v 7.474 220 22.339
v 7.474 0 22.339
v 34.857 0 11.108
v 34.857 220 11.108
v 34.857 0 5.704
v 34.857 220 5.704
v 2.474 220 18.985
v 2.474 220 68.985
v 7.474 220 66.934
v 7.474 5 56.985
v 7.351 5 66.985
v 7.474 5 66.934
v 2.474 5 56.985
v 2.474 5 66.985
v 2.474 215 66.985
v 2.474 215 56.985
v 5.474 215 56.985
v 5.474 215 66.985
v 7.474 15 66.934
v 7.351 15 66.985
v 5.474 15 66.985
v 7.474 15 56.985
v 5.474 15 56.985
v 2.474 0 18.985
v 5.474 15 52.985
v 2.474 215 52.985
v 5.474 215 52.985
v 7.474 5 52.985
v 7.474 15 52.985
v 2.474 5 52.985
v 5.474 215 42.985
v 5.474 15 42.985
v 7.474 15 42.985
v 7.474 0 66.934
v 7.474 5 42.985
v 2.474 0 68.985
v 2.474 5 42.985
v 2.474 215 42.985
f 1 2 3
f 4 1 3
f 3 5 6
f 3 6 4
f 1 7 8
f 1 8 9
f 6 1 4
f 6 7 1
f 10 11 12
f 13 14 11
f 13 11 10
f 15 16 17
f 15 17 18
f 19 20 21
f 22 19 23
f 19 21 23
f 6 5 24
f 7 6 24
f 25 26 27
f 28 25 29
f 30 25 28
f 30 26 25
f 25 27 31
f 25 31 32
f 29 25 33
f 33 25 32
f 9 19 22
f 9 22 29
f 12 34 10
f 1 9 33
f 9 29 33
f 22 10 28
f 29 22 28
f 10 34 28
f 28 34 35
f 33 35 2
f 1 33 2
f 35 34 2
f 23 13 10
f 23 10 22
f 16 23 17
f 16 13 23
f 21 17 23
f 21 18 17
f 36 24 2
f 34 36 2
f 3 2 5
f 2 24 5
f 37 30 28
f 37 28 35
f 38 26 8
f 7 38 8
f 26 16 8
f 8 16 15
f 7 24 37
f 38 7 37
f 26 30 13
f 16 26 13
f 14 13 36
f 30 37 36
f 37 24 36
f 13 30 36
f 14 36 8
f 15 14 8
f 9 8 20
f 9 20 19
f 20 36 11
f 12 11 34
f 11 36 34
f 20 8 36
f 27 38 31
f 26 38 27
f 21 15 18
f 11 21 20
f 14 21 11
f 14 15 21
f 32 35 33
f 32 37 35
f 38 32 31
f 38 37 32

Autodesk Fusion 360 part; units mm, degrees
sketch "Sketch1" plane through (0, 0, 0) normal (0, 1, 0) x (1, 0, 0)
  line L0 (2.4744, -68.9852) -> (7.4744, -68.9852)
  line L1 (7.4744, -68.9852) -> (7.4744, -22.3387)
  line L2 (7.4744, -22.3387) -> (36.754, -10.3303)
  line L3 (36.754, -10.3303) -> (34.8567, -5.7042)
  line L4 (34.8567, -5.7042) -> (2.4744, -18.9852)
  line L5 (2.4744, -18.9852) -> (2.4744, -68.9852)
  line L6 (2.4744, -68.9852) -> (7.4744, -66.9345)
  line L7 (34.8567, -5.7042) -> (34.8567, -11.1084)
  dimension "d1" = 5
  dimension "d2" = 5
  dimension "d3" = 112.3
  dimension "d16" = 50
  dimension "d18" = 22.3
  dimension "d20" = 35
extrude "Extrude1" add sketch "Sketch1" along normal blind 220 contours L1 L2 L4 L5 L6 L7
sketch "Sketch2" plane through (2.4744, 0, 0) normal (-1, 0, 0) x (0, -1, 0)
  line L0 (0, 18.9852) -> (0, 68.9852)
  line L1 (-220, 68.9852) -> (-220, 18.9852)
  line L2 (-220, 18.9852) -> (0, 18.9852)
  line L3 (-215, 66.9852) -> (-5, 66.9852)
  line L4 (-5, 66.9852) -> (-5, 56.9852)
  line L5 (-5, 56.9852) -> (-215, 56.9852)
  line L6 (-215, 56.9852) -> (-215, 66.9852)
  line L7 (-215, 52.9852) -> (-5, 52.9852)
  line L8 (-5, 52.9852) -> (-5, 42.9852)
  line L9 (-5, 42.9852) -> (-215, 42.9852)
  line L10 (-215, 42.9852) -> (-215, 52.9852)
  line L11 (-5, 66.9852) -> (-15, 66.9852)
  line L12 (-15, 56.9852) -> (-5, 56.9852)
  line L13 (-5, 56.9852) -> (-5, 66.9852)
  line L14 (-5, 52.9852) -> (-15, 52.9852)
  line L15 (-15, 42.9852) -> (-5, 42.9852)
  line L16 (-5, 42.9852) -> (-5, 52.9852)
  line L17 (0, 68.9852) -> (-220, 68.9852)
  dimension "d6" = 210
  dimension "d7" = 210
  dimension "d8" = 5
  dimension "d9" = 5
  dimension "d12" = 10
  dimension "d13" = 10
  dimension "d22" = 4
  dimension "d30" = 2
extrude "Extrude2" cut sketch "Sketch2" against normal blind 3 contours L3 L4 L5 L6 L11 L12 L13 | L7 L8 L9 L10 L14 L15 L16
sketch "Sketch3" plane through (5.4744, 0, 0) normal (-1, 0, 0) x (0, -1, 0)
  line L0 (-215, 56.9852) -> (-5, 56.9852)
  line L1 (-5, 56.9852) -> (-5, 66.9852)
  line L2 (-5, 66.9852) -> (-215, 66.9852)
  line L3 (-215, 66.9852) -> (-215, 56.9852)
  line L4 (-5, 66.9852) -> (-15, 66.9852)
  line L5 (-15, 66.9852) -> (-15, 56.9852)
  line L6 (-15, 56.9852) -> (-5, 56.9852)
  line L7 (-5, 56.9852) -> (-5, 66.9852)
  dimension "d33" = 10
  dimension "d34" = 10
sketch "Sketch4" plane through (5.4744, 0, 0) normal (-1, 0, 0) x (0, -1, 0)
  line L0 (-215, 42.9852) -> (-5, 42.9852)
  line L1 (-5, 42.9852) -> (-5, 52.9852)
  line L2 (-215, 52.9852) -> (-215, 42.9852)
  line L3 (-5, 52.9852) -> (-15, 52.9852)
  line L4 (-15, 52.9852) -> (-15, 42.9852)
  line L5 (-15, 42.9852) -> (-5, 42.9852)
  line L6 (-5, 42.9852) -> (-5, 52.9852)
  line L7 (-5, 52.9852) -> (-215, 52.9852)
  dimension "d26" = 10
  dimension "d27" = 10
extrude "Extrude3" cut sketch "Sketch3" sketch "Sketch4" against normal blind 2 contours L0 L1 L2 L4 L5 L6 L7 of sketch 2 contours L0 L1 L3 L4 L5 L6 L7
equation "d4 = 200 mm + 10 mm + 5 mm + 5 mm"
equation "d6 = 200 mm + 10 mm"
equation "d7 = 200 mm + 10 mm"
